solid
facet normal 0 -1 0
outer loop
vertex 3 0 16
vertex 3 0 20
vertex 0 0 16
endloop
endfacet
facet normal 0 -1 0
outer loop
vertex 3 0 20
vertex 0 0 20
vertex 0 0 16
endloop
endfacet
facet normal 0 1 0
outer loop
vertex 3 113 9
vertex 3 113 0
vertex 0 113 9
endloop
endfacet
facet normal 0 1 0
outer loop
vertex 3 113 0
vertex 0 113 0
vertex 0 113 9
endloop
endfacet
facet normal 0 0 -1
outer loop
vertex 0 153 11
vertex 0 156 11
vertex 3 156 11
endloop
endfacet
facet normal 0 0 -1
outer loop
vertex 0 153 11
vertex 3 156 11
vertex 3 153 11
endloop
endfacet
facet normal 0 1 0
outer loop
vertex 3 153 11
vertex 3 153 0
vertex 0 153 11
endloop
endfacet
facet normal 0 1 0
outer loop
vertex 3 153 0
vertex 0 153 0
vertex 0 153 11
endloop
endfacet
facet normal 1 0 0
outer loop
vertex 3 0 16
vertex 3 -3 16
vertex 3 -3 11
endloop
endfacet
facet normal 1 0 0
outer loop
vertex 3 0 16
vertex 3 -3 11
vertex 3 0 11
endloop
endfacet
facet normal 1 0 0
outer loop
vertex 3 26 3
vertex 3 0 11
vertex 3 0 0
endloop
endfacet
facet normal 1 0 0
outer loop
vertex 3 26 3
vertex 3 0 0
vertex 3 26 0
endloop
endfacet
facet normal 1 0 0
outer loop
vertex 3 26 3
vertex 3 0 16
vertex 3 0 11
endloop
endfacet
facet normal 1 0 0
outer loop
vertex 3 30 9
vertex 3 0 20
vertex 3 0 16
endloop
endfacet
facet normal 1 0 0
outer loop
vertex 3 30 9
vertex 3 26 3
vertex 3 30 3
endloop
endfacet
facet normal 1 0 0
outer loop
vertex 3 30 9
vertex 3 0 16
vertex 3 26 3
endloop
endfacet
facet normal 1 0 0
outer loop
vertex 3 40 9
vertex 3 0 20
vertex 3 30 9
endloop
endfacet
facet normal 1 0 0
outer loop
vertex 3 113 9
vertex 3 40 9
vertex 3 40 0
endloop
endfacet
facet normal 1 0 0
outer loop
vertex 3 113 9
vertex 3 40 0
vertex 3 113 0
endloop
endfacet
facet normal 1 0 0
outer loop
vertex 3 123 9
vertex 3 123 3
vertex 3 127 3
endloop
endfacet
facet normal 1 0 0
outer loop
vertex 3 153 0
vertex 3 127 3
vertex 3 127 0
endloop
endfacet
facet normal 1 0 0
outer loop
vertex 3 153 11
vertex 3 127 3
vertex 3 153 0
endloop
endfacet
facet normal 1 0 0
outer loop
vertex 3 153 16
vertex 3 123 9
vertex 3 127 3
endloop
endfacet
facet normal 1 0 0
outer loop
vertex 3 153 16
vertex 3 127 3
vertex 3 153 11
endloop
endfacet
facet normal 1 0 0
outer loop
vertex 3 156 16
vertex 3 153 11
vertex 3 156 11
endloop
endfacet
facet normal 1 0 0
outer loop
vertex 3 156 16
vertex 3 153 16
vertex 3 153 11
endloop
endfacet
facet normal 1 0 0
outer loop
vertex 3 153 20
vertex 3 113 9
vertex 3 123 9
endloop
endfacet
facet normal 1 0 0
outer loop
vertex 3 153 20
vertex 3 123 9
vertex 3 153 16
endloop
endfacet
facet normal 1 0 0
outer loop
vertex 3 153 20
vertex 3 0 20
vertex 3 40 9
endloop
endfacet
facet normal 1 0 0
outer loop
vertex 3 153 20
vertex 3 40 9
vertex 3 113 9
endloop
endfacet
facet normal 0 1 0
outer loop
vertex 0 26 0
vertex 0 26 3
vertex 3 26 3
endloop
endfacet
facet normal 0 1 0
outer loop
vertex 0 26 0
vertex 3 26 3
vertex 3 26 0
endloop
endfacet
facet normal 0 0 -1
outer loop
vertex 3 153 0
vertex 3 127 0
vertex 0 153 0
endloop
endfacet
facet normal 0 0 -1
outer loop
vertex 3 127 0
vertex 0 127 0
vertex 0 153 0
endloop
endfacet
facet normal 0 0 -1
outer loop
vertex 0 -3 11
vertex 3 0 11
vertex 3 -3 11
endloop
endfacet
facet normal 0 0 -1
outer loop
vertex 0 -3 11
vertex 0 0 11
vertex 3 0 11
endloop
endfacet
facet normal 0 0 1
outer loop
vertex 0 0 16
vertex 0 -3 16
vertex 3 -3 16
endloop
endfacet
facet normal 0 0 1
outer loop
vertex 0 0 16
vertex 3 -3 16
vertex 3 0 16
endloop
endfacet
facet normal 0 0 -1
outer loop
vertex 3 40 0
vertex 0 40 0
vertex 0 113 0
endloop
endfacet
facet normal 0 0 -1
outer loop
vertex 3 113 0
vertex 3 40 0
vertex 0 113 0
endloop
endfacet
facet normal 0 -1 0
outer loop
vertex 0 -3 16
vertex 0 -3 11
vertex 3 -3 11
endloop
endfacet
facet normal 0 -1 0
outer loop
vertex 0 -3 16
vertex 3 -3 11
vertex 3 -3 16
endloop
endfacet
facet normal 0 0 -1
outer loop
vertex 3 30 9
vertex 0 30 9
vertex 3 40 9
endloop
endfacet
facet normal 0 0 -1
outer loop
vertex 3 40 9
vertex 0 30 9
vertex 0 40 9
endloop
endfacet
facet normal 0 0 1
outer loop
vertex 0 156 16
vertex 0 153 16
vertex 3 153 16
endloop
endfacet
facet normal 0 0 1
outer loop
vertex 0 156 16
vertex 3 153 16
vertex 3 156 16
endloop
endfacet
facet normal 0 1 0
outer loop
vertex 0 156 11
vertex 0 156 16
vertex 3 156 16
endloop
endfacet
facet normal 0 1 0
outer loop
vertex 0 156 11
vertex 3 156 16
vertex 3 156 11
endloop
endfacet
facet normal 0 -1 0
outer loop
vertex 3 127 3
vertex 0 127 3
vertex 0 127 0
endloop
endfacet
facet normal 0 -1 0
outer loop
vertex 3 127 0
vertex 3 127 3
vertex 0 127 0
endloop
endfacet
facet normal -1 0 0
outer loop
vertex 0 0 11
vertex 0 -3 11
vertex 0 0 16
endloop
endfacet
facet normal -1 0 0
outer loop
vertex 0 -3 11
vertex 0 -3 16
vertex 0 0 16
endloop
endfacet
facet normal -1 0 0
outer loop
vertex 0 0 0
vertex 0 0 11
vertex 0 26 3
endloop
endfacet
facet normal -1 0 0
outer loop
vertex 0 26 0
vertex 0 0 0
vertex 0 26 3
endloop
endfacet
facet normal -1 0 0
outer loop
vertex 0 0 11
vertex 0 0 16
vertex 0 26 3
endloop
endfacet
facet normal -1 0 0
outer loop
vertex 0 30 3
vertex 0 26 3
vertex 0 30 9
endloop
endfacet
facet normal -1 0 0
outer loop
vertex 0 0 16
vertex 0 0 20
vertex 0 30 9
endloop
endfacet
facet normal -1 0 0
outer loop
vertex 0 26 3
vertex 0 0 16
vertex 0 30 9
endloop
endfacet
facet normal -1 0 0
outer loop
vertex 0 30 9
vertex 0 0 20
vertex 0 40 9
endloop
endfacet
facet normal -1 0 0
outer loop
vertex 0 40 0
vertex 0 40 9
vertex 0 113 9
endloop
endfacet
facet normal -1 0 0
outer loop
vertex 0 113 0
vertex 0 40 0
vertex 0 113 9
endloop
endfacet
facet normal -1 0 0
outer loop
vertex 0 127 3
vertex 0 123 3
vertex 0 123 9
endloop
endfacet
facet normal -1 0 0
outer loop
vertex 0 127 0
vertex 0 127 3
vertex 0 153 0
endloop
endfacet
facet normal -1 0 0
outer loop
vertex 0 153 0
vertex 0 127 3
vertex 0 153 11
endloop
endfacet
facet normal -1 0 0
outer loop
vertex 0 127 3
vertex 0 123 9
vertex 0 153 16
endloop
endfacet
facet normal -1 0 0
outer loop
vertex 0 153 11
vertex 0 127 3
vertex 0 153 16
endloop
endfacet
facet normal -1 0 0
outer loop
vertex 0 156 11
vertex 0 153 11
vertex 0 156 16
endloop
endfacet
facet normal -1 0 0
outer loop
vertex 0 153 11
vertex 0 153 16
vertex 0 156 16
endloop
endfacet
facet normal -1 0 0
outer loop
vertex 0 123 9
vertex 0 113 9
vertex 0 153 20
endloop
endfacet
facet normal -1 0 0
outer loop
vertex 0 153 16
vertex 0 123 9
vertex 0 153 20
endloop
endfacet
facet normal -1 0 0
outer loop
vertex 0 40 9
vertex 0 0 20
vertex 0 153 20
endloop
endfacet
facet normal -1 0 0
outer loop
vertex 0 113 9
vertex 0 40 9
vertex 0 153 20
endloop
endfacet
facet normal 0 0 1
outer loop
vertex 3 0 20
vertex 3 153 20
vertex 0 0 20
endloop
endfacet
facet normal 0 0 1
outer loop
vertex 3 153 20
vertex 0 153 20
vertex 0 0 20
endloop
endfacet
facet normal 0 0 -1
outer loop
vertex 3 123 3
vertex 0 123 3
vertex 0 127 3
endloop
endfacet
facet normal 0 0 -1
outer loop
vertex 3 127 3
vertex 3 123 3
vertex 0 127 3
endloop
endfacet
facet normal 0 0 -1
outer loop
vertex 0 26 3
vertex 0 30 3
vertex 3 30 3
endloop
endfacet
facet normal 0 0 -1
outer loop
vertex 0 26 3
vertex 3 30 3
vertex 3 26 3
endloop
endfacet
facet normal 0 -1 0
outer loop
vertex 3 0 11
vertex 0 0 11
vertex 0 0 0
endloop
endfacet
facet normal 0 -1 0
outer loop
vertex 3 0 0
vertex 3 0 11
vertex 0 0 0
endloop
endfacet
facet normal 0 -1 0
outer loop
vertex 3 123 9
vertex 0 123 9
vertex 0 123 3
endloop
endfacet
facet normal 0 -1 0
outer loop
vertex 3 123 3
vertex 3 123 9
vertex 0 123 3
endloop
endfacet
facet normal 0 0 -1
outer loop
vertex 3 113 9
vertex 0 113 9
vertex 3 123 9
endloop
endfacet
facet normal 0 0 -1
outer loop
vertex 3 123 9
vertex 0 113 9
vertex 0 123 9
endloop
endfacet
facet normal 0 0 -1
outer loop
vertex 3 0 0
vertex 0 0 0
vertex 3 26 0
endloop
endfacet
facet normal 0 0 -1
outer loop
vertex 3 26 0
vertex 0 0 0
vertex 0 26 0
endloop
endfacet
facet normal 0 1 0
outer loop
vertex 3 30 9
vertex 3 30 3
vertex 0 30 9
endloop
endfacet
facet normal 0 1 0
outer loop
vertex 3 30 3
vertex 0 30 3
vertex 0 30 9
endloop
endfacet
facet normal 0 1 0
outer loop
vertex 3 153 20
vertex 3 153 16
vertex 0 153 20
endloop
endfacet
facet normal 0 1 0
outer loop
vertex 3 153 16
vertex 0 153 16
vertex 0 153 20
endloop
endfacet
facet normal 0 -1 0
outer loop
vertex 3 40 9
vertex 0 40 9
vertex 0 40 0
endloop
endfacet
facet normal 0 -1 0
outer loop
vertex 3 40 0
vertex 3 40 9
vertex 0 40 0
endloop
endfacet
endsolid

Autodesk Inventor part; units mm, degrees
ref_plane "YZ Plane" through (0, 0, 0) normal (1, 0, 0) x (0, 1, 0)
ref_plane "XZ Plane" through (0, 0, 0) normal (0, 1, 0) x (-1, 0, 0)
ref_plane "XY Plane" through (0, 0, 0) normal (0, 0, 1) x (1, 0, 0)
sketch "Sketch1" plane through (0, 0, 0) normal (1, 0, 0) x (0, 1, 0)
  line L0 (0, 11) -> (-3, 11)
  line L1 (-3, 11) -> (-3, 16)
  line L2 (-3, 16) -> (0, 16)
  line L3 (0, 20) -> (0, 16)
  line L4 (0, 11) -> (0, 0)
  line L5 (153, 16) -> (156, 16)
  line L6 (156, 16) -> (156, 11)
  line L7 (156, 11) -> (153, 11)
  line L8 (153, 0) -> (153, 11)
  line L9 (153, 16) -> (153, 20)
  line L10 (30, 3) -> (30, 9)
  line L11 (30, 9) -> (40, 9)
  line L12 (40, 9) -> (40, 0)
  line L13 (113, 0) -> (113, 9)
  line L14 (113, 9) -> (123, 9)
  line L15 (123, 9) -> (123, 3)
  line L16 (127, 0) -> (153, 0)
  line L17 (0, 0) -> (26, 0)
  line L18 (40, 0) -> (113, 0)
  line L19 (153, 20) -> (0, 20)
  line L20 (30, 3) -> (26, 3)
  line L21 (26, 3) -> (26, 0)
  line L22 (123, 3) -> (127, 3)
  line L23 (127, 3) -> (127, 0)
  dimension "d0" = 20
  dimension "d1" = 153
  dimension "d2" = 5
  dimension "d3" = 3
  dimension "d5" = 3
  dimension "d6" = 5
  dimension "d7" = 10
  dimension "d9" = 30
  dimension "d11" = 10
  dimension "d12" = 30
  dimension "d21" = 11
  dimension "d25" = 4
  dimension "d26" = 3
  dimension "d28" = 4
  dimension "d30" = 9
  dimension "d31" = 9
  dimension "d32" = 9
  dimension "d33" = 20
  dimension "d34" = 3
  dimension "d35" = 26
extrude "Extrusion2" add sketch "Sketch1" along normal blind 3
properties part number "MainPanelWall3"
